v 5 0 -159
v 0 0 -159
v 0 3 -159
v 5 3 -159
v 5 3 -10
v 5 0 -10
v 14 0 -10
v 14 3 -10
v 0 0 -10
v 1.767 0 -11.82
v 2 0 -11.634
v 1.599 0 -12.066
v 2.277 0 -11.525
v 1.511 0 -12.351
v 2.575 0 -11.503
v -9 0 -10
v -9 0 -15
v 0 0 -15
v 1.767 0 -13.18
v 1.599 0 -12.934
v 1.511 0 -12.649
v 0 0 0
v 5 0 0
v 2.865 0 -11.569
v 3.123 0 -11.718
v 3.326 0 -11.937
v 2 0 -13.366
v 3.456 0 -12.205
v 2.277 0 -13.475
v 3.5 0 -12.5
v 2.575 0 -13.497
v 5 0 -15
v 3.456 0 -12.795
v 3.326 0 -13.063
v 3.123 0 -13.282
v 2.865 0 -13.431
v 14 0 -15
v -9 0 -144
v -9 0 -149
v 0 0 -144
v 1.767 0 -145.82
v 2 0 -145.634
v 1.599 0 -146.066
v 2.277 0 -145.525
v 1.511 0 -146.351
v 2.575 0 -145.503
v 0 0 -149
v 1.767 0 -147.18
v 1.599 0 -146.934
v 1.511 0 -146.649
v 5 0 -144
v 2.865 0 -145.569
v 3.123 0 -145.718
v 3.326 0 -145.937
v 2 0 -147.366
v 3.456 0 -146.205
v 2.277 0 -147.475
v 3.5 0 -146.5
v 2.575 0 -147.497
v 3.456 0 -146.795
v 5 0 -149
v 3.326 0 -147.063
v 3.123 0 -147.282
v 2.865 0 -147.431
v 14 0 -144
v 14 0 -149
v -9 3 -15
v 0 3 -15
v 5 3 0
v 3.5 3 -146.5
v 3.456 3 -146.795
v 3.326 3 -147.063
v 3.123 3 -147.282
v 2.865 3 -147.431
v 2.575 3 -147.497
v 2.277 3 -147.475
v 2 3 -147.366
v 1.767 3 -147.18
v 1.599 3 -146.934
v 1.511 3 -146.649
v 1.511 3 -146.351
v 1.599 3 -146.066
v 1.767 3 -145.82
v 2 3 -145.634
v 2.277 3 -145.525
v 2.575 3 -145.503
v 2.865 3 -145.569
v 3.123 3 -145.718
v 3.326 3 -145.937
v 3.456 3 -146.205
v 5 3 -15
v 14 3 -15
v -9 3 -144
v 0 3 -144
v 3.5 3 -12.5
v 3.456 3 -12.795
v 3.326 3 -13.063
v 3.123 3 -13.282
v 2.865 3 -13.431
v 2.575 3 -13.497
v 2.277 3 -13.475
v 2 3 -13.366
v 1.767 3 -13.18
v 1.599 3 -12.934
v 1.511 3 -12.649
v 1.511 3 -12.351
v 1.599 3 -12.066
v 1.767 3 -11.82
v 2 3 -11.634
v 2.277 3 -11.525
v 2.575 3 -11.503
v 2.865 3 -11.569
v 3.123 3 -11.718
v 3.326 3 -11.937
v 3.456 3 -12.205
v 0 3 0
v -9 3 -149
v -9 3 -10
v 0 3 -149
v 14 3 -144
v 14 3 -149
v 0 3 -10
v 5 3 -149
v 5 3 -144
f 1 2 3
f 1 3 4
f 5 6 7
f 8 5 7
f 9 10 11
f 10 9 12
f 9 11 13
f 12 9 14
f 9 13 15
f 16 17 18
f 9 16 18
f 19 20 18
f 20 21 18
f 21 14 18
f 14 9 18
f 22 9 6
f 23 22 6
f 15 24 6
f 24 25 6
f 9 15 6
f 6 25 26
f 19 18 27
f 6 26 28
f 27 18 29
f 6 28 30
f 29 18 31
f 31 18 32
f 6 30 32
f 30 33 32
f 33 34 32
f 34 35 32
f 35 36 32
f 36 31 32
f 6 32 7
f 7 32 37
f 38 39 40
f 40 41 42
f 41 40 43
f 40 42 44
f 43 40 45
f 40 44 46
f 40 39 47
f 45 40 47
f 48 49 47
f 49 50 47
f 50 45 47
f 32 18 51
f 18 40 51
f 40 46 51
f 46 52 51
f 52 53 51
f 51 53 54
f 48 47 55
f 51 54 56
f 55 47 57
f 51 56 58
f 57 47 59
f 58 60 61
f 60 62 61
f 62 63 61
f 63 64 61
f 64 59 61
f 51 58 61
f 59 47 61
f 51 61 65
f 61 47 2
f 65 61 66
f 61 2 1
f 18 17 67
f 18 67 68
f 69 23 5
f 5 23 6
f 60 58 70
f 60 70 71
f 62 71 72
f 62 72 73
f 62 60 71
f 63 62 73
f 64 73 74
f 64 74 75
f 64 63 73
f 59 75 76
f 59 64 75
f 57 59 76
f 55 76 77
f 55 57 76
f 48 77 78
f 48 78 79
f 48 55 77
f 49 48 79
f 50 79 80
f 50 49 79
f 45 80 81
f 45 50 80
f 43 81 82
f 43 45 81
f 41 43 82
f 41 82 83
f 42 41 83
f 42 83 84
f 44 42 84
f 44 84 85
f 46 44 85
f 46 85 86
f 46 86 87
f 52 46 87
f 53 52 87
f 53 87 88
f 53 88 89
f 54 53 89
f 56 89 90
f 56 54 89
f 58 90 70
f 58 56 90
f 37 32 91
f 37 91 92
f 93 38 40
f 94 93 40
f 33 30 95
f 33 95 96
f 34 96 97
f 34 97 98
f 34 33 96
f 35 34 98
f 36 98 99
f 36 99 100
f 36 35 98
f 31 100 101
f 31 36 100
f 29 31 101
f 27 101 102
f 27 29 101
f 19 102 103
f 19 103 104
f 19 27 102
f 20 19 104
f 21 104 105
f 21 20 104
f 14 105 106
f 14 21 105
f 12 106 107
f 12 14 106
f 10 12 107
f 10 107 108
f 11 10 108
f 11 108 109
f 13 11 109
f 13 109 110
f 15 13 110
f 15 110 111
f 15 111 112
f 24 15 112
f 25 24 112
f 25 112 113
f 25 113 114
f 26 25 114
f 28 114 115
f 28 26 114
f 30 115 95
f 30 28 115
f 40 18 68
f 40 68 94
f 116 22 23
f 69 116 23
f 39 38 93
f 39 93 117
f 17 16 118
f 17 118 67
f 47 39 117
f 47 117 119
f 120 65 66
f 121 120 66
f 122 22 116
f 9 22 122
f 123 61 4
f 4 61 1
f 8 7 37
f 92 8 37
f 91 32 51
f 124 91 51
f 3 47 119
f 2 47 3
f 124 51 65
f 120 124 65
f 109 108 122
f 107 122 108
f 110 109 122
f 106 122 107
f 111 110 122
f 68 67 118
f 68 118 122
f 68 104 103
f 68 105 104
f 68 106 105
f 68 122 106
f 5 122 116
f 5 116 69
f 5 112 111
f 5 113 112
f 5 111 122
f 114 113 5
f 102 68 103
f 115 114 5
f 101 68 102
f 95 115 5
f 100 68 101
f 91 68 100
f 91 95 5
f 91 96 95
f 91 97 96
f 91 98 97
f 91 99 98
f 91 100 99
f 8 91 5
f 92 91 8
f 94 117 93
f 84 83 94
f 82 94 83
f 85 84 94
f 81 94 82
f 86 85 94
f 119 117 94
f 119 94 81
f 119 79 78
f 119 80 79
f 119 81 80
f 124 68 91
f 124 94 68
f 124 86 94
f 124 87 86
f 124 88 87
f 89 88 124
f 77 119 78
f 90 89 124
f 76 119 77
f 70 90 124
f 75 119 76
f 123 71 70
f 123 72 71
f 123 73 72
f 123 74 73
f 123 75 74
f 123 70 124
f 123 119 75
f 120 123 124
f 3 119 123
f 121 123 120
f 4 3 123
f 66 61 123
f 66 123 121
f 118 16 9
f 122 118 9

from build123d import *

# Parameters (mm, degrees)
SKETCH1_W           = 5
SKETCH1_H           = 159
BOSS_EXTRUDE1_DEPTH = 3
SKETCH3_W           = 23
SKETCH3_H           = 5
BOSS_EXTRUDE2_DEPTH = 3
SKETCH5_R           = 1
CUT_EXTRUDE4_DEPTH  = 3


with BuildPart() as part:
    # Sketch1 → Boss-Extrude1 (new body)
    with BuildSketch(Plane(origin=(0, 0, 0), x_dir=(1, 0, 0), z_dir=(0, 1, 0))):
        with Locations((2.5, 79.5)):
            Rectangle(SKETCH1_W, SKETCH1_H)
    extrude(amount=BOSS_EXTRUDE1_DEPTH)

    # Sketch3 → Boss-Extrude2 (add)
    with BuildSketch(Plane(origin=(0, 0, 0), x_dir=(1, 0, 0), z_dir=(0, 1, 0))):
        with Locations((2.5, 12.5)):
            Rectangle(SKETCH3_W, SKETCH3_H)
        with Locations((2.5, 146.5)):
            Rectangle(SKETCH3_W, SKETCH3_H)
    extrude(amount=BOSS_EXTRUDE2_DEPTH)

    # Sketch5 → Cut-Extrude4 (cut)
    with BuildSketch(Plane(origin=(0, 0, 0), x_dir=(1, 0, 0), z_dir=(0, 1, 0))):
        with Locations((2.5, 12.5)):
            Circle(SKETCH5_R)
        with Locations((2.5, 146.5)):
            Circle(SKETCH5_R)
    extrude(amount=CUT_EXTRUDE4_DEPTH, mode=Mode.SUBTRACT)


solid = part.part
